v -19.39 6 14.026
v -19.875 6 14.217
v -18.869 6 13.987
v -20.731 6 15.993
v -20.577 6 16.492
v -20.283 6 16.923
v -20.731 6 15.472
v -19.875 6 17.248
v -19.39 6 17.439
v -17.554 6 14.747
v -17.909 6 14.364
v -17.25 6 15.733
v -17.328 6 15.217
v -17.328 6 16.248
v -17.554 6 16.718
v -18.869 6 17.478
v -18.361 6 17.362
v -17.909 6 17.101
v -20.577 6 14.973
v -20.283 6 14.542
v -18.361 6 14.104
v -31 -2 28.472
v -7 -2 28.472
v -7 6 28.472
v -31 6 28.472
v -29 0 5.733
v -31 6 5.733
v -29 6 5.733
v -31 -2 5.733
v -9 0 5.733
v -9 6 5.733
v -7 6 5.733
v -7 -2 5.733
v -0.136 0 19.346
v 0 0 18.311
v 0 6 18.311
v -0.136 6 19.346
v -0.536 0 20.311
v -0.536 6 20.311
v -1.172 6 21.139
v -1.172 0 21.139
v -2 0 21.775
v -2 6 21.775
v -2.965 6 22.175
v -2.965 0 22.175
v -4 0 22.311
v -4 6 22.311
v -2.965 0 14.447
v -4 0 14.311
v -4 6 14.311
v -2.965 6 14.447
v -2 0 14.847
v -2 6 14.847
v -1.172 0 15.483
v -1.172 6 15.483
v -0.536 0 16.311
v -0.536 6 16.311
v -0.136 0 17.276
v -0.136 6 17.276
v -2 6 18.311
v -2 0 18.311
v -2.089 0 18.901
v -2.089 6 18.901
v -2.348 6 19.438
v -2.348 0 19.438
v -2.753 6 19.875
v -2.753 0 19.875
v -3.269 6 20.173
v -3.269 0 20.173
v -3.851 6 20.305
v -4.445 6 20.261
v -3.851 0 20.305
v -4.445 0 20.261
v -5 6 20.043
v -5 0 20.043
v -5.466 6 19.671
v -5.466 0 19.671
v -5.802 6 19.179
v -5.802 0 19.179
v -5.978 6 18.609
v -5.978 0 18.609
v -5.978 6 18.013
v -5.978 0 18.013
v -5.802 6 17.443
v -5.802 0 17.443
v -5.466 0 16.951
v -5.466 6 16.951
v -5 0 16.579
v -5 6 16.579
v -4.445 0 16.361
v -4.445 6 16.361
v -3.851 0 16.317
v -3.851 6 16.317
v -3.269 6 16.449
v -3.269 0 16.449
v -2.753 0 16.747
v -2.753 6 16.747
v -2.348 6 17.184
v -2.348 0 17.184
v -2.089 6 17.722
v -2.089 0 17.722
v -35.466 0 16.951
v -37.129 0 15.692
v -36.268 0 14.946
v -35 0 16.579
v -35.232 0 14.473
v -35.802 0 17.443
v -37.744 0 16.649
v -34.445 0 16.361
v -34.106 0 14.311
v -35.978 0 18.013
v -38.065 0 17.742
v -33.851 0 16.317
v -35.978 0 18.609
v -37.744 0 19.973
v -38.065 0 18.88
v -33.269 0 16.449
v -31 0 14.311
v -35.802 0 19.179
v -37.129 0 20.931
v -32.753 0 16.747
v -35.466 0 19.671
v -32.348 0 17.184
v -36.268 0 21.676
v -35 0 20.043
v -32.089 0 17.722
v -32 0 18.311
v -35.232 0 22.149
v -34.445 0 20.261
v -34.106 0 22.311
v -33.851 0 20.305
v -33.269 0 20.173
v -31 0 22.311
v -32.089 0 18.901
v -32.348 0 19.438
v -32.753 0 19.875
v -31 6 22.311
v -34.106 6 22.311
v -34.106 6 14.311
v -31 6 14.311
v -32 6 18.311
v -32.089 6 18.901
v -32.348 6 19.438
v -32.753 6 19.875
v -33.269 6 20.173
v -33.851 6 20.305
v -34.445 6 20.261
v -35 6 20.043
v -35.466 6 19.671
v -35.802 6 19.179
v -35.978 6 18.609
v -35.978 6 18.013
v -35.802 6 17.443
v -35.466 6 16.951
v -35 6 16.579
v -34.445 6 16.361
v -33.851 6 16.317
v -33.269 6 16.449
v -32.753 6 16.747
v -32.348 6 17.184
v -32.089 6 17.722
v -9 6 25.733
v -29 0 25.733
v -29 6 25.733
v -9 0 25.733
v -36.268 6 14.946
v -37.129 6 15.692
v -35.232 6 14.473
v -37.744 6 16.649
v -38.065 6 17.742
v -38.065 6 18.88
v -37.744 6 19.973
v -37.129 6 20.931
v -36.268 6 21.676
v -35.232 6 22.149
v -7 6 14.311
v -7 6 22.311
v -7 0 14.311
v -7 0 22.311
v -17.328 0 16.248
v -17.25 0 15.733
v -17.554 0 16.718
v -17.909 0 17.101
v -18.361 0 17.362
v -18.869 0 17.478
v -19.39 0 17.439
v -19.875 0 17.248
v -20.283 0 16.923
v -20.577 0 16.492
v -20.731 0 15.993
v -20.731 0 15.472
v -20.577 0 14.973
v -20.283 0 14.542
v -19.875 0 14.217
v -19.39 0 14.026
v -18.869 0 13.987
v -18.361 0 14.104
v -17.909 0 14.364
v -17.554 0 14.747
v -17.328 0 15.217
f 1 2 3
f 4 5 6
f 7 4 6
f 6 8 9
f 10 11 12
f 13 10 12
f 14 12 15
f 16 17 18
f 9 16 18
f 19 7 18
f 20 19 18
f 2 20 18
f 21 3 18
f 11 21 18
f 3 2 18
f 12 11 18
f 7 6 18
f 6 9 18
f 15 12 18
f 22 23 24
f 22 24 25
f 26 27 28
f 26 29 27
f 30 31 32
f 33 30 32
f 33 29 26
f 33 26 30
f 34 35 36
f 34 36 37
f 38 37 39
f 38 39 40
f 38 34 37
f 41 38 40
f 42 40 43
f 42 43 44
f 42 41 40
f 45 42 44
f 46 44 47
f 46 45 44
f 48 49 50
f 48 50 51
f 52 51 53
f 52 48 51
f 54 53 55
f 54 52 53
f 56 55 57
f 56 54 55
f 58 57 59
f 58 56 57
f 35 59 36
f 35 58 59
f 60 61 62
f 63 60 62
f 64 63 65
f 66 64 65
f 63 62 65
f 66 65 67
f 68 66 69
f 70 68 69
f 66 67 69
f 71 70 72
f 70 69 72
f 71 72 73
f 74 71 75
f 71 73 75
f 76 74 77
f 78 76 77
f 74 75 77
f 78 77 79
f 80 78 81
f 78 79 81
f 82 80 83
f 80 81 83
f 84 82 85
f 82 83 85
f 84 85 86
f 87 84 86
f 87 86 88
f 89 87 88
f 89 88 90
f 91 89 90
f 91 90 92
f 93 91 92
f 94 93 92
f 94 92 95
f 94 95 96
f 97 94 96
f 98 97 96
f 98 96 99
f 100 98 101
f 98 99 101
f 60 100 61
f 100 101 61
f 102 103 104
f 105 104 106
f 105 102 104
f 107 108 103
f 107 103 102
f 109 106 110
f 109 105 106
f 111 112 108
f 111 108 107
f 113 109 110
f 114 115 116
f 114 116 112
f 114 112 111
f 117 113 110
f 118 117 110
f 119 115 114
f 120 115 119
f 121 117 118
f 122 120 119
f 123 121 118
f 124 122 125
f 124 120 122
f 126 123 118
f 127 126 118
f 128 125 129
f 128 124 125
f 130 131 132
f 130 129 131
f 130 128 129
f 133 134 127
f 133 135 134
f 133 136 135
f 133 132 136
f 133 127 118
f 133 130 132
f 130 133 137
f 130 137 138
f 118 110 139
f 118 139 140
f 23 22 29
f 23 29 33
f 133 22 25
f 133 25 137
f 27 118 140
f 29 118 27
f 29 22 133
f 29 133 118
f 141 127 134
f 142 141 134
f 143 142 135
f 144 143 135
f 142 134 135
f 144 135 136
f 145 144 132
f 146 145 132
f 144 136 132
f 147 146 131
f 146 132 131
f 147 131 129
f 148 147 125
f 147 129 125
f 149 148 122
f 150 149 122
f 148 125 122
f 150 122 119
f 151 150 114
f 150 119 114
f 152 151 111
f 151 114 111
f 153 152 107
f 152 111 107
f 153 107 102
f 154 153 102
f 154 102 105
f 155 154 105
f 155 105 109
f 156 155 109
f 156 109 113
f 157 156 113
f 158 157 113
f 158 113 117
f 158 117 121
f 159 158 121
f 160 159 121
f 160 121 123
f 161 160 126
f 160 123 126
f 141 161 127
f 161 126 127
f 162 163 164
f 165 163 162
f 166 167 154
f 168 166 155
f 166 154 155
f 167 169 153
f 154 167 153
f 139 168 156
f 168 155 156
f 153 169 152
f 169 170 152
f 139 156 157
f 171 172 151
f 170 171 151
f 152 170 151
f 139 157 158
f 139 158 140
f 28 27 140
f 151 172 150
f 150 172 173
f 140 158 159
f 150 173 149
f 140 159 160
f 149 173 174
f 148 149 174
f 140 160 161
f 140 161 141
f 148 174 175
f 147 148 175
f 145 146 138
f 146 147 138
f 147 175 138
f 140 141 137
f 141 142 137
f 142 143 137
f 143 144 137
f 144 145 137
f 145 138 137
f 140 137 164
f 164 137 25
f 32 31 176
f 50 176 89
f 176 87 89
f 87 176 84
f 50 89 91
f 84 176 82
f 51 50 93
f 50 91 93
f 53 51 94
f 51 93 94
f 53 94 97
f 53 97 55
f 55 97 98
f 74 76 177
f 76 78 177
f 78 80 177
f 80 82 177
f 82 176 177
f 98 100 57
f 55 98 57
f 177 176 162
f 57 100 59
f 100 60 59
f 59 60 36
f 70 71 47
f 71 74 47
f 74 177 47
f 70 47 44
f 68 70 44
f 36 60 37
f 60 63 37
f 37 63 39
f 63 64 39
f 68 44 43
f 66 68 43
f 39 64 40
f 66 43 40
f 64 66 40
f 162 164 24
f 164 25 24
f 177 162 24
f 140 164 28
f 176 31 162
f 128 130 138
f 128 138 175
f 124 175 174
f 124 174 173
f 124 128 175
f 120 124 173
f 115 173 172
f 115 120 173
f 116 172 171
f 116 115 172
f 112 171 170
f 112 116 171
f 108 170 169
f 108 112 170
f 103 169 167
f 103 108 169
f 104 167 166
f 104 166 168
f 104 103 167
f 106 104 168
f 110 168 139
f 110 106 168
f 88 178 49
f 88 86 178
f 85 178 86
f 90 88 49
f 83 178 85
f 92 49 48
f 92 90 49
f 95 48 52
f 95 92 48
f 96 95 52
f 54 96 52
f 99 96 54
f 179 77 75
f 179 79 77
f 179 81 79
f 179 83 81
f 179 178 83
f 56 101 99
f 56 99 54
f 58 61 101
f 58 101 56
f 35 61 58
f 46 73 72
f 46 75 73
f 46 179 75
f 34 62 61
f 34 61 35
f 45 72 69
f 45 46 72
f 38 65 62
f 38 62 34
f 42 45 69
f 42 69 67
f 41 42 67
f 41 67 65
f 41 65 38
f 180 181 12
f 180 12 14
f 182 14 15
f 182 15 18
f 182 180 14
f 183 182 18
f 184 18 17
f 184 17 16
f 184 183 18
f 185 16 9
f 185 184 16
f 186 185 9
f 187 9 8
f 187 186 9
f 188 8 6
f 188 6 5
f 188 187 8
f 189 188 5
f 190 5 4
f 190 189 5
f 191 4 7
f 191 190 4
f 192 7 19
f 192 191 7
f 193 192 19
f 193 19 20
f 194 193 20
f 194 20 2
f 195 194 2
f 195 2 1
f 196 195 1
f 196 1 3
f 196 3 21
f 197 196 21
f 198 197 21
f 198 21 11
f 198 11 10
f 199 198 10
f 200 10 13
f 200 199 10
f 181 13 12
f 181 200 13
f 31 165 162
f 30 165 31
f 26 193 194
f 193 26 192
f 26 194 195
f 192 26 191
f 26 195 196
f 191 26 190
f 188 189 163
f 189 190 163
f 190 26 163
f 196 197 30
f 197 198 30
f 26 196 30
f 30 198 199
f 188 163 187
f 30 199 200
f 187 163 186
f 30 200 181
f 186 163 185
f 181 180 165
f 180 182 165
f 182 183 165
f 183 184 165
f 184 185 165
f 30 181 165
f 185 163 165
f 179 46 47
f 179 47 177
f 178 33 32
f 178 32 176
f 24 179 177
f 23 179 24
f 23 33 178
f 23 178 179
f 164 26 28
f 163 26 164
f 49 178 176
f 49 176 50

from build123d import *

# Parameters (mm, degrees)
F0_W     = 20
F0_H     = 20
F0_R     = 1.75
F1_DEPTH = 2
F0_R_2   = 2
F2_DEPTH = 6


# Not quite as in the source:
# - a feature names something its author has since deleted; it is built from what else it names


with BuildPart() as f1:
    # F0 (on Front) → F1 (new body)
    with BuildSketch(Plane.XZ):
        Polygon((-29.00025, 5.7325412996), (-29.00025, 25.7325412996), (-9.00025, 25.7325412996), (-9.00025, 5.7325412996), (-7.00025, 5.7325412996), (-7.00025, 14.311070554), (-7.00025, 22.311070554), (-7.00025, 28.4722108253), (-31.00025, 28.4722108253), (-31.00025, 22.311070554), (-31.00025, 14.311070554), (-31.00025, 5.7325412996), align=None)
        with Locations((-19.00025, 15.7325412996)):
            Rectangle(F0_W, F0_H)
        with Locations((-19.00025, 15.7325412996)):
            Circle(F0_R, mode=Mode.SUBTRACT)
        with Locations((-19.00025, 15.7325412996)):
            Circle(F0_R)
    extrude(amount=F1_DEPTH)

    # F0 (on Front) → F2 (join)
    with BuildSketch(Plane.XZ):
        Polygon((-29.00025, 5.7325412996), (-29.00025, 25.7325412996), (-9.00025, 25.7325412996), (-9.00025, 5.7325412996), (-7.00025, 5.7325412996), (-7.00025, 14.311070554), (-7.00025, 22.311070554), (-7.00025, 28.4722108253), (-31.00025, 28.4722108253), (-31.00025, 22.311070554), (-31.00025, 14.311070554), (-31.00025, 5.7325412996), align=None)
        with BuildLine():
            Line((-7.00025, 22.311070554), (-7.00025, 14.311070554))
            Line((-7.00025, 14.311070554), (-4, 14.311070554))
            ThreePointArc((-4, 14.311070554), (-1.1715728753, 15.4826434292), (0, 18.311070554))
            ThreePointArc((0, 18.311070554), (-1.1715728753, 21.1394976787), (-4, 22.311070554))
            Line((-4, 22.311070554), (-7.00025, 22.311070554))
        make_face()
        with Locations((-4, 18.311070554)):
            Circle(F0_R_2, mode=Mode.SUBTRACT)
        with Locations((-19.00025, 15.7325412996)):
            Circle(F0_R)
        with BuildLine():
            Line((-34.1055206901, 14.311070554), (-31.00025, 14.311070554))
            Line((-31.00025, 14.311070554), (-31.00025, 22.311070554))
            Line((-31.00025, 22.311070554), (-34.1055206901, 22.311070554))
            ThreePointArc((-34.1055206901, 22.311070554), (-38.1055206901, 18.311070554), (-34.1055206901, 14.311070554))
        make_face()
        with Locations((-34, 18.311070554)):
            Circle(F0_R_2, mode=Mode.SUBTRACT)
    extrude(amount=-F2_DEPTH)


solid = f1.part
